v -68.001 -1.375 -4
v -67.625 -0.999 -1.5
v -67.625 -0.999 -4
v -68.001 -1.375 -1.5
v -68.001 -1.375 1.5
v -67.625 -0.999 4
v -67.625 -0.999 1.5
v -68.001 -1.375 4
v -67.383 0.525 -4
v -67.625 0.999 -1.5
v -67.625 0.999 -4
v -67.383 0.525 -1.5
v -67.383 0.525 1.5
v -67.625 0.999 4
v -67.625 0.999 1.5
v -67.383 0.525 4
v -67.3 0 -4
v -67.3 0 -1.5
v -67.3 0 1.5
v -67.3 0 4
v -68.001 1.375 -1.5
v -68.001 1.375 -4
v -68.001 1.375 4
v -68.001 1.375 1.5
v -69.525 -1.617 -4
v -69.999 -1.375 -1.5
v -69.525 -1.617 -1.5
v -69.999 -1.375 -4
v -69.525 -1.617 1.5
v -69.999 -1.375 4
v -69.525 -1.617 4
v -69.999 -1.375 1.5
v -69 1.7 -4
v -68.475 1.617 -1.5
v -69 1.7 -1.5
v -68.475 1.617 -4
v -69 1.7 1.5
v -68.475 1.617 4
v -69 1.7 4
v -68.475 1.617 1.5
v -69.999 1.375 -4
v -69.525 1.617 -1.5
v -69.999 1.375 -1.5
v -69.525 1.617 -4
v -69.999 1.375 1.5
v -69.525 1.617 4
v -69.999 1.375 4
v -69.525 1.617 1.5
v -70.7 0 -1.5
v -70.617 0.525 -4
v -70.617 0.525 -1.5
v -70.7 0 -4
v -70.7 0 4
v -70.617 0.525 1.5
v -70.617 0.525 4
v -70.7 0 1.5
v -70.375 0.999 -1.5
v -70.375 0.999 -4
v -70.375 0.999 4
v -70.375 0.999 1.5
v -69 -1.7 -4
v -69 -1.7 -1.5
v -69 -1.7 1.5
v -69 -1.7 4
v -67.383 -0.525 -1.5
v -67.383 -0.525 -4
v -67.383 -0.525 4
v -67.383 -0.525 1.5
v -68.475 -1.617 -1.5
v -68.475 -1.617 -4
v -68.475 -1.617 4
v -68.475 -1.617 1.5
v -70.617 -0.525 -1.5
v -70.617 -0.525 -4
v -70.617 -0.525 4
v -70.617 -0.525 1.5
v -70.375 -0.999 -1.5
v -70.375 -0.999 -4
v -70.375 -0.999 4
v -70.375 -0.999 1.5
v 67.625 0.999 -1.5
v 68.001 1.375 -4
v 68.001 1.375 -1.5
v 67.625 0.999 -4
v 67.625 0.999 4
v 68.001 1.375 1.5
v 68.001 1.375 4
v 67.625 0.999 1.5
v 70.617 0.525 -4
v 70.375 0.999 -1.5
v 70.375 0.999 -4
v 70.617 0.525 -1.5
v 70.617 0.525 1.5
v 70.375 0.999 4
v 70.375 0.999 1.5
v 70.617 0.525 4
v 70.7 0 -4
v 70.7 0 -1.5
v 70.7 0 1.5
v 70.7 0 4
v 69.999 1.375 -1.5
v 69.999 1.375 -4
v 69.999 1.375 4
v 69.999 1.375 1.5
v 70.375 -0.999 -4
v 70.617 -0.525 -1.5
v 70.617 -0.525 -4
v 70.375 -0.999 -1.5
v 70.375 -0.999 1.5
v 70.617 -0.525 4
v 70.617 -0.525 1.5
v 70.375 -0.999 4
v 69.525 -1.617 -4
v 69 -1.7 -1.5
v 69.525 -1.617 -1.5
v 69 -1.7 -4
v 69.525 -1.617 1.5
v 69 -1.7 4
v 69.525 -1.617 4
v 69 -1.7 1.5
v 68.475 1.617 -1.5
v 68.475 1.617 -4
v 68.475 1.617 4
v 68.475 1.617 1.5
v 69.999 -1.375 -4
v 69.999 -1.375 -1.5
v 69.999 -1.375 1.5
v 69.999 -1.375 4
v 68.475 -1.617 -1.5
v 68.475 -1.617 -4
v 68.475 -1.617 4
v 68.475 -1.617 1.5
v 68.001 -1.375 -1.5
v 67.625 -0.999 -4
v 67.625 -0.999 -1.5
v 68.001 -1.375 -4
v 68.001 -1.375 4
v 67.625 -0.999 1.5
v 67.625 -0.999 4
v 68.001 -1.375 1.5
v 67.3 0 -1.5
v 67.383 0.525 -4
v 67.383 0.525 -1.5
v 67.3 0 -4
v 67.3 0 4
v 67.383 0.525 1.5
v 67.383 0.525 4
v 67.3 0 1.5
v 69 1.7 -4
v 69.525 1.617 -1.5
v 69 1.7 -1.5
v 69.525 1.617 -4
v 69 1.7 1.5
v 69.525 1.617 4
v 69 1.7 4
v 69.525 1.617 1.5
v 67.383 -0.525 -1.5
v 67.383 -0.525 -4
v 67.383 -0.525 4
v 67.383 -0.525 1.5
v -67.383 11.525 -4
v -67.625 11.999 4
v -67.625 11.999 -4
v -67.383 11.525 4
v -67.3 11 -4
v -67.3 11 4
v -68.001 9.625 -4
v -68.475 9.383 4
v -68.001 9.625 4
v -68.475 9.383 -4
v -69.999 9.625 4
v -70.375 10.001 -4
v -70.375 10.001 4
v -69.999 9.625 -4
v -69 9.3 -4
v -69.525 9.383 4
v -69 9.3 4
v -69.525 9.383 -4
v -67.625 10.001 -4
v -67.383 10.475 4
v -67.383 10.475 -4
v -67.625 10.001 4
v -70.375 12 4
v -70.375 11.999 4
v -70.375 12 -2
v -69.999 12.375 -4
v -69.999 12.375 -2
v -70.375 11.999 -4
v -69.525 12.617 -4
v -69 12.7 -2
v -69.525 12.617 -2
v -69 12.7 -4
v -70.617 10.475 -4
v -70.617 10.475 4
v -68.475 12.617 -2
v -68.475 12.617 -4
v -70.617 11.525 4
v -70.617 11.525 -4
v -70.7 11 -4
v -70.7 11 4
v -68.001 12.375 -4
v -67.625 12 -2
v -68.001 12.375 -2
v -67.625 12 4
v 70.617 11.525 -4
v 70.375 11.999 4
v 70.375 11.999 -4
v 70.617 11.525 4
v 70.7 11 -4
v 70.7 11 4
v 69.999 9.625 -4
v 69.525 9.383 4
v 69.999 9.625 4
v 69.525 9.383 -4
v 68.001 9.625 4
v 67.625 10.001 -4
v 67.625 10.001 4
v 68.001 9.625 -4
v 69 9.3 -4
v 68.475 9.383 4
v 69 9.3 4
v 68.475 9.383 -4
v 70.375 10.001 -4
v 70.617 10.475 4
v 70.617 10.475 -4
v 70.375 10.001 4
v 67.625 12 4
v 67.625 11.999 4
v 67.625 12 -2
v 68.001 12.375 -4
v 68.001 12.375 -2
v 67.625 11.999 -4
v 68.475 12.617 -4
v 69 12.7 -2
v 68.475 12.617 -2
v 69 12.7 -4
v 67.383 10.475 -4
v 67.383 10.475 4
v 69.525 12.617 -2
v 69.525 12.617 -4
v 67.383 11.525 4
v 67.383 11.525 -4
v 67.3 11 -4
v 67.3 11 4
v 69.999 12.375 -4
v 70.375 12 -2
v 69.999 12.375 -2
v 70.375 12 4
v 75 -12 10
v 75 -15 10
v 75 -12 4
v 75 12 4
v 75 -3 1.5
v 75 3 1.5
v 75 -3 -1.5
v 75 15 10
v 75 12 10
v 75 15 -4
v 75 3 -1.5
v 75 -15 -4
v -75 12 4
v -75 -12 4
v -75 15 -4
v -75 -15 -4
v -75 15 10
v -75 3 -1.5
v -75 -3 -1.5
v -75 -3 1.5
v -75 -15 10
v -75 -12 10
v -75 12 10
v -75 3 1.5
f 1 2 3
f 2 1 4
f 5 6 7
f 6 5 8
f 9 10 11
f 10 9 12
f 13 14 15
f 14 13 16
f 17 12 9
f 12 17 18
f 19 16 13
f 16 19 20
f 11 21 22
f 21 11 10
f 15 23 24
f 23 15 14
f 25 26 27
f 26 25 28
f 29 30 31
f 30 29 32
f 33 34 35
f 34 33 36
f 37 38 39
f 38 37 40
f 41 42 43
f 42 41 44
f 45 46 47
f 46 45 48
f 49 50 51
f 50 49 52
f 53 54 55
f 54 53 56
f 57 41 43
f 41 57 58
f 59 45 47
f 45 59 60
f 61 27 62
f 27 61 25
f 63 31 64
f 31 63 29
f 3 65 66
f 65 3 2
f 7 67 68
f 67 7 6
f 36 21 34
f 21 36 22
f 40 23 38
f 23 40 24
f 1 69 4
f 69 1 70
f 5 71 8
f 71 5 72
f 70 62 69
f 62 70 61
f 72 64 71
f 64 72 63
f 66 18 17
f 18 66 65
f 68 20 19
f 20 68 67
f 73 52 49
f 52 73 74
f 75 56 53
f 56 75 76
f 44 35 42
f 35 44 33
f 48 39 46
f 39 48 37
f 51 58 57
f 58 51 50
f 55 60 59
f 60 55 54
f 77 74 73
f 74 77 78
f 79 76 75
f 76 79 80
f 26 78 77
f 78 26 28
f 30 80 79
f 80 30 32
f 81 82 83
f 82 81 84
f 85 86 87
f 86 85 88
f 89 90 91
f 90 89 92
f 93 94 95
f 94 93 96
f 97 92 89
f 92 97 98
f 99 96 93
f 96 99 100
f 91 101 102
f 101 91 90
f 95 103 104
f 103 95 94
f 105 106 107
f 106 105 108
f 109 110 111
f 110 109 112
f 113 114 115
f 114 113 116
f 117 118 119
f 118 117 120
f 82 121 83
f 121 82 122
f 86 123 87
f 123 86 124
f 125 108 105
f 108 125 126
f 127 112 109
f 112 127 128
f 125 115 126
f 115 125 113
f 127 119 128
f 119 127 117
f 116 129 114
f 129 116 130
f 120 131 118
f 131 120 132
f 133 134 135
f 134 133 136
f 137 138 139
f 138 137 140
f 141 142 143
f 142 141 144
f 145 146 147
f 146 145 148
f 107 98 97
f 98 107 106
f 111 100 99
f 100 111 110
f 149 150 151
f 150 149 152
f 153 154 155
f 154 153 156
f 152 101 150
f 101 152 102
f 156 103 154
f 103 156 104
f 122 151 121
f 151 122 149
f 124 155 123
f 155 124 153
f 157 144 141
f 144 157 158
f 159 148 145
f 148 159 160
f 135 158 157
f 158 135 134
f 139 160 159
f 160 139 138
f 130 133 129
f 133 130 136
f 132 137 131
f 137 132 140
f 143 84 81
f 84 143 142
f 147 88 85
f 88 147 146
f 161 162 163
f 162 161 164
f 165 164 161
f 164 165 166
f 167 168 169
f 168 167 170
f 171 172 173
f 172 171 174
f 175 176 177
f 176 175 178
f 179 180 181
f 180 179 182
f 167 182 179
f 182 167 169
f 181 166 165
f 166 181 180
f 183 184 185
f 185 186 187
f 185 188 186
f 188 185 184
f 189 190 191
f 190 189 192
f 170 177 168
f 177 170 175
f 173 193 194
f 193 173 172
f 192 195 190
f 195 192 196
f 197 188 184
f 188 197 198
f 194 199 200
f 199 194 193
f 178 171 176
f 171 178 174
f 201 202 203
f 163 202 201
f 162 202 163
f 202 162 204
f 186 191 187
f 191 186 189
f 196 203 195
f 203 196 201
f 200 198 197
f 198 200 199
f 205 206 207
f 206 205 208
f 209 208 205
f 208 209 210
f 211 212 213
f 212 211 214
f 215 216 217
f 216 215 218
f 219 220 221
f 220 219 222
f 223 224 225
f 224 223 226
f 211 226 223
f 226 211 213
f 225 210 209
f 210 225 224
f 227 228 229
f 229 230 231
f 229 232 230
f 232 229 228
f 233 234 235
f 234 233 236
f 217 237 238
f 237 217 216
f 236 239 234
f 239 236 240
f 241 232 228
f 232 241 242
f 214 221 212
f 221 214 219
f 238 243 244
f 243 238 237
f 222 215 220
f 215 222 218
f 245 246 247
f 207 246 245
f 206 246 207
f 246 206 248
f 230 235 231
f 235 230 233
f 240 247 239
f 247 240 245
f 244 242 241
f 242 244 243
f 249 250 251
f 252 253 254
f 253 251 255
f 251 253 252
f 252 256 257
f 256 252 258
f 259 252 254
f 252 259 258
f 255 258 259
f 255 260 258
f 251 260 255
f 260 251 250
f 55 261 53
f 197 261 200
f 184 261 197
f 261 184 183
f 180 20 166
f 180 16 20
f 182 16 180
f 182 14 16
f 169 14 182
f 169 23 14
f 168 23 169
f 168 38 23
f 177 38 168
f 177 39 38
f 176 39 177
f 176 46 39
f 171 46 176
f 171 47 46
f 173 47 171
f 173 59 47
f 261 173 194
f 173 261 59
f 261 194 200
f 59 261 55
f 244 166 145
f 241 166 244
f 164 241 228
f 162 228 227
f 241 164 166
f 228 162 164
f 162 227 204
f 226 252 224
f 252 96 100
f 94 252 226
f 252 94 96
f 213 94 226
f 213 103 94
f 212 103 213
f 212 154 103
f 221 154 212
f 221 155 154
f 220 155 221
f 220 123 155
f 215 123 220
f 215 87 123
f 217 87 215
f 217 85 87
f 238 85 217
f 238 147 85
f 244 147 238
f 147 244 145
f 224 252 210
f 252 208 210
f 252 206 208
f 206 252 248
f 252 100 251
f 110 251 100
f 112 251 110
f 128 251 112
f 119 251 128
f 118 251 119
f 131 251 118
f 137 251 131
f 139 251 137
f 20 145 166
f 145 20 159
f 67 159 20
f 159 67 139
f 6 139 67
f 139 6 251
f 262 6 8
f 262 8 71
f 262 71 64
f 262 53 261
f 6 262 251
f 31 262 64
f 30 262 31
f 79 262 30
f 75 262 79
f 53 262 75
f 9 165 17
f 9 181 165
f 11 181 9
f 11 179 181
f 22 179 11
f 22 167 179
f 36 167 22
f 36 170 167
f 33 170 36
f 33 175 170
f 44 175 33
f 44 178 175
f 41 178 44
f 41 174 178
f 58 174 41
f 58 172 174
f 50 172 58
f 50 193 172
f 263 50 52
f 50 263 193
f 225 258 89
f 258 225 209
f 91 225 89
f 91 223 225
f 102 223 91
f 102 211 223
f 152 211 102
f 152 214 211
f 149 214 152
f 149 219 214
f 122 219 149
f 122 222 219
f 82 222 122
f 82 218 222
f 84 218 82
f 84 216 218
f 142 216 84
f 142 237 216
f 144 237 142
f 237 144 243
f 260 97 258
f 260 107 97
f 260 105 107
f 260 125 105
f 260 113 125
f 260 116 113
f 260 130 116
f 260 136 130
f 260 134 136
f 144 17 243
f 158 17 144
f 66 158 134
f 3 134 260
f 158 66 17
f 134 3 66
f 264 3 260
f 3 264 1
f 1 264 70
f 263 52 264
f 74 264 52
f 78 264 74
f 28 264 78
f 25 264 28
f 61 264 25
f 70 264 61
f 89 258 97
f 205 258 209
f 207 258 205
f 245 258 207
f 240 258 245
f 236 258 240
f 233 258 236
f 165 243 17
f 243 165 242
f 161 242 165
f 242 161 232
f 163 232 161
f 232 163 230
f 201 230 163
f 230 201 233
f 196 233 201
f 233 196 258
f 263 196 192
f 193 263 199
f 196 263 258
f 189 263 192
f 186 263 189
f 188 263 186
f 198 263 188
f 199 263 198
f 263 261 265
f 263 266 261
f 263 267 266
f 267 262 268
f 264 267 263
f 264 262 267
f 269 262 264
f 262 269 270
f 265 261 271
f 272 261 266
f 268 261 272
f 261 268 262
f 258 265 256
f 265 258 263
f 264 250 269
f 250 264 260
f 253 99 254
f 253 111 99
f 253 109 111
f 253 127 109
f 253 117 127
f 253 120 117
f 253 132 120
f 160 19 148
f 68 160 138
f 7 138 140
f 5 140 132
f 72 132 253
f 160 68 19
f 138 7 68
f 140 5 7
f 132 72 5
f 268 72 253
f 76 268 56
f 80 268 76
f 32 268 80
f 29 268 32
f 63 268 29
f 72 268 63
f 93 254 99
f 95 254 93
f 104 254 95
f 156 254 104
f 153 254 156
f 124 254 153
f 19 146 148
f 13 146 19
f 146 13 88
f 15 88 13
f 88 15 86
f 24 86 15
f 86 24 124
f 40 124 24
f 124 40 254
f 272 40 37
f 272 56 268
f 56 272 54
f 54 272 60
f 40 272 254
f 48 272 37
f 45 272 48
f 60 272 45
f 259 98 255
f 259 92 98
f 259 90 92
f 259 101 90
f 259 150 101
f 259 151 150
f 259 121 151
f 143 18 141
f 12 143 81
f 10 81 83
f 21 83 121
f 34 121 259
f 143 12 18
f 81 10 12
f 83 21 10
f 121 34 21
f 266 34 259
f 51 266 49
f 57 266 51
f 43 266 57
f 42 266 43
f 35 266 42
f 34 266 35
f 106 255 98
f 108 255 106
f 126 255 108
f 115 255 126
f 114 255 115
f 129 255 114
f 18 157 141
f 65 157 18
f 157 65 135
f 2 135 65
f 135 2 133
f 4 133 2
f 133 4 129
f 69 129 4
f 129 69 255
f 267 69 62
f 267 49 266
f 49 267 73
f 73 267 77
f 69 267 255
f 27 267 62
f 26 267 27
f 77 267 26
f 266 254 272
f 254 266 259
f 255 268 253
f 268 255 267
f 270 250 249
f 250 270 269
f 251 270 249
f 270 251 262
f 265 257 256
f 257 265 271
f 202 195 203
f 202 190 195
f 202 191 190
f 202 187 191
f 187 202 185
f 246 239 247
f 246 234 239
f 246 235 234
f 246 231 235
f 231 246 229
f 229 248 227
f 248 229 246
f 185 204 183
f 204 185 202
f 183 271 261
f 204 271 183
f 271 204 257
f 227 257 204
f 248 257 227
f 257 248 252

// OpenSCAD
// Parametric conveyor track segment for the MyZubster assembly line.
// Interconnects stations and advances the child between positions.
// Issue #80 task: Creare sequenza di assemblaggio.
// Print in PETG, 50% infill; drive with NEMA17 stepper via timing belt.

// Parameters (mm)
track_l = 150;            // track segment length (between station centers)
track_w = 30;           // track width
track_h = 8;            // track height
belt_slot_w = 6;        // timing belt slot width
belt_slot_h = 3;       // timing belt slot depth
rail_h = 12;           // guide rail height
rail_w = 3;            // guide rail thickness
bolt_dia = 3.4;        // M3 mounting
$fn = 48;

module conveyor_track() {
  difference() {
    cube([track_l, track_w, track_h], center = true);
    // timing belt slot down the middle
    cube([track_l, belt_slot_w, belt_slot_h], center = true);
    // mounting holes at both ends
    for (sx = [-1, 1])
      translate([sx * (track_l / 2 - 6), 0, 0])
        cylinder(h = track_h + 2, d = bolt_dia, $fn = 20, center = true);
    for (sx = [-1, 1])
      translate([sx * (track_l / 2 - 6), track_w / 2 - 4, 0])
        cylinder(h = track_h + 2, d = bolt_dia, $fn = 20, center = true);
  }
  // guide rails on both sides
  for (sy = [-1, 1])
    translate([0, sy * (track_w / 2 - rail_w / 2), track_h / 2])
      cube([track_l, rail_w, rail_h], center = true);
}

conveyor_track();
